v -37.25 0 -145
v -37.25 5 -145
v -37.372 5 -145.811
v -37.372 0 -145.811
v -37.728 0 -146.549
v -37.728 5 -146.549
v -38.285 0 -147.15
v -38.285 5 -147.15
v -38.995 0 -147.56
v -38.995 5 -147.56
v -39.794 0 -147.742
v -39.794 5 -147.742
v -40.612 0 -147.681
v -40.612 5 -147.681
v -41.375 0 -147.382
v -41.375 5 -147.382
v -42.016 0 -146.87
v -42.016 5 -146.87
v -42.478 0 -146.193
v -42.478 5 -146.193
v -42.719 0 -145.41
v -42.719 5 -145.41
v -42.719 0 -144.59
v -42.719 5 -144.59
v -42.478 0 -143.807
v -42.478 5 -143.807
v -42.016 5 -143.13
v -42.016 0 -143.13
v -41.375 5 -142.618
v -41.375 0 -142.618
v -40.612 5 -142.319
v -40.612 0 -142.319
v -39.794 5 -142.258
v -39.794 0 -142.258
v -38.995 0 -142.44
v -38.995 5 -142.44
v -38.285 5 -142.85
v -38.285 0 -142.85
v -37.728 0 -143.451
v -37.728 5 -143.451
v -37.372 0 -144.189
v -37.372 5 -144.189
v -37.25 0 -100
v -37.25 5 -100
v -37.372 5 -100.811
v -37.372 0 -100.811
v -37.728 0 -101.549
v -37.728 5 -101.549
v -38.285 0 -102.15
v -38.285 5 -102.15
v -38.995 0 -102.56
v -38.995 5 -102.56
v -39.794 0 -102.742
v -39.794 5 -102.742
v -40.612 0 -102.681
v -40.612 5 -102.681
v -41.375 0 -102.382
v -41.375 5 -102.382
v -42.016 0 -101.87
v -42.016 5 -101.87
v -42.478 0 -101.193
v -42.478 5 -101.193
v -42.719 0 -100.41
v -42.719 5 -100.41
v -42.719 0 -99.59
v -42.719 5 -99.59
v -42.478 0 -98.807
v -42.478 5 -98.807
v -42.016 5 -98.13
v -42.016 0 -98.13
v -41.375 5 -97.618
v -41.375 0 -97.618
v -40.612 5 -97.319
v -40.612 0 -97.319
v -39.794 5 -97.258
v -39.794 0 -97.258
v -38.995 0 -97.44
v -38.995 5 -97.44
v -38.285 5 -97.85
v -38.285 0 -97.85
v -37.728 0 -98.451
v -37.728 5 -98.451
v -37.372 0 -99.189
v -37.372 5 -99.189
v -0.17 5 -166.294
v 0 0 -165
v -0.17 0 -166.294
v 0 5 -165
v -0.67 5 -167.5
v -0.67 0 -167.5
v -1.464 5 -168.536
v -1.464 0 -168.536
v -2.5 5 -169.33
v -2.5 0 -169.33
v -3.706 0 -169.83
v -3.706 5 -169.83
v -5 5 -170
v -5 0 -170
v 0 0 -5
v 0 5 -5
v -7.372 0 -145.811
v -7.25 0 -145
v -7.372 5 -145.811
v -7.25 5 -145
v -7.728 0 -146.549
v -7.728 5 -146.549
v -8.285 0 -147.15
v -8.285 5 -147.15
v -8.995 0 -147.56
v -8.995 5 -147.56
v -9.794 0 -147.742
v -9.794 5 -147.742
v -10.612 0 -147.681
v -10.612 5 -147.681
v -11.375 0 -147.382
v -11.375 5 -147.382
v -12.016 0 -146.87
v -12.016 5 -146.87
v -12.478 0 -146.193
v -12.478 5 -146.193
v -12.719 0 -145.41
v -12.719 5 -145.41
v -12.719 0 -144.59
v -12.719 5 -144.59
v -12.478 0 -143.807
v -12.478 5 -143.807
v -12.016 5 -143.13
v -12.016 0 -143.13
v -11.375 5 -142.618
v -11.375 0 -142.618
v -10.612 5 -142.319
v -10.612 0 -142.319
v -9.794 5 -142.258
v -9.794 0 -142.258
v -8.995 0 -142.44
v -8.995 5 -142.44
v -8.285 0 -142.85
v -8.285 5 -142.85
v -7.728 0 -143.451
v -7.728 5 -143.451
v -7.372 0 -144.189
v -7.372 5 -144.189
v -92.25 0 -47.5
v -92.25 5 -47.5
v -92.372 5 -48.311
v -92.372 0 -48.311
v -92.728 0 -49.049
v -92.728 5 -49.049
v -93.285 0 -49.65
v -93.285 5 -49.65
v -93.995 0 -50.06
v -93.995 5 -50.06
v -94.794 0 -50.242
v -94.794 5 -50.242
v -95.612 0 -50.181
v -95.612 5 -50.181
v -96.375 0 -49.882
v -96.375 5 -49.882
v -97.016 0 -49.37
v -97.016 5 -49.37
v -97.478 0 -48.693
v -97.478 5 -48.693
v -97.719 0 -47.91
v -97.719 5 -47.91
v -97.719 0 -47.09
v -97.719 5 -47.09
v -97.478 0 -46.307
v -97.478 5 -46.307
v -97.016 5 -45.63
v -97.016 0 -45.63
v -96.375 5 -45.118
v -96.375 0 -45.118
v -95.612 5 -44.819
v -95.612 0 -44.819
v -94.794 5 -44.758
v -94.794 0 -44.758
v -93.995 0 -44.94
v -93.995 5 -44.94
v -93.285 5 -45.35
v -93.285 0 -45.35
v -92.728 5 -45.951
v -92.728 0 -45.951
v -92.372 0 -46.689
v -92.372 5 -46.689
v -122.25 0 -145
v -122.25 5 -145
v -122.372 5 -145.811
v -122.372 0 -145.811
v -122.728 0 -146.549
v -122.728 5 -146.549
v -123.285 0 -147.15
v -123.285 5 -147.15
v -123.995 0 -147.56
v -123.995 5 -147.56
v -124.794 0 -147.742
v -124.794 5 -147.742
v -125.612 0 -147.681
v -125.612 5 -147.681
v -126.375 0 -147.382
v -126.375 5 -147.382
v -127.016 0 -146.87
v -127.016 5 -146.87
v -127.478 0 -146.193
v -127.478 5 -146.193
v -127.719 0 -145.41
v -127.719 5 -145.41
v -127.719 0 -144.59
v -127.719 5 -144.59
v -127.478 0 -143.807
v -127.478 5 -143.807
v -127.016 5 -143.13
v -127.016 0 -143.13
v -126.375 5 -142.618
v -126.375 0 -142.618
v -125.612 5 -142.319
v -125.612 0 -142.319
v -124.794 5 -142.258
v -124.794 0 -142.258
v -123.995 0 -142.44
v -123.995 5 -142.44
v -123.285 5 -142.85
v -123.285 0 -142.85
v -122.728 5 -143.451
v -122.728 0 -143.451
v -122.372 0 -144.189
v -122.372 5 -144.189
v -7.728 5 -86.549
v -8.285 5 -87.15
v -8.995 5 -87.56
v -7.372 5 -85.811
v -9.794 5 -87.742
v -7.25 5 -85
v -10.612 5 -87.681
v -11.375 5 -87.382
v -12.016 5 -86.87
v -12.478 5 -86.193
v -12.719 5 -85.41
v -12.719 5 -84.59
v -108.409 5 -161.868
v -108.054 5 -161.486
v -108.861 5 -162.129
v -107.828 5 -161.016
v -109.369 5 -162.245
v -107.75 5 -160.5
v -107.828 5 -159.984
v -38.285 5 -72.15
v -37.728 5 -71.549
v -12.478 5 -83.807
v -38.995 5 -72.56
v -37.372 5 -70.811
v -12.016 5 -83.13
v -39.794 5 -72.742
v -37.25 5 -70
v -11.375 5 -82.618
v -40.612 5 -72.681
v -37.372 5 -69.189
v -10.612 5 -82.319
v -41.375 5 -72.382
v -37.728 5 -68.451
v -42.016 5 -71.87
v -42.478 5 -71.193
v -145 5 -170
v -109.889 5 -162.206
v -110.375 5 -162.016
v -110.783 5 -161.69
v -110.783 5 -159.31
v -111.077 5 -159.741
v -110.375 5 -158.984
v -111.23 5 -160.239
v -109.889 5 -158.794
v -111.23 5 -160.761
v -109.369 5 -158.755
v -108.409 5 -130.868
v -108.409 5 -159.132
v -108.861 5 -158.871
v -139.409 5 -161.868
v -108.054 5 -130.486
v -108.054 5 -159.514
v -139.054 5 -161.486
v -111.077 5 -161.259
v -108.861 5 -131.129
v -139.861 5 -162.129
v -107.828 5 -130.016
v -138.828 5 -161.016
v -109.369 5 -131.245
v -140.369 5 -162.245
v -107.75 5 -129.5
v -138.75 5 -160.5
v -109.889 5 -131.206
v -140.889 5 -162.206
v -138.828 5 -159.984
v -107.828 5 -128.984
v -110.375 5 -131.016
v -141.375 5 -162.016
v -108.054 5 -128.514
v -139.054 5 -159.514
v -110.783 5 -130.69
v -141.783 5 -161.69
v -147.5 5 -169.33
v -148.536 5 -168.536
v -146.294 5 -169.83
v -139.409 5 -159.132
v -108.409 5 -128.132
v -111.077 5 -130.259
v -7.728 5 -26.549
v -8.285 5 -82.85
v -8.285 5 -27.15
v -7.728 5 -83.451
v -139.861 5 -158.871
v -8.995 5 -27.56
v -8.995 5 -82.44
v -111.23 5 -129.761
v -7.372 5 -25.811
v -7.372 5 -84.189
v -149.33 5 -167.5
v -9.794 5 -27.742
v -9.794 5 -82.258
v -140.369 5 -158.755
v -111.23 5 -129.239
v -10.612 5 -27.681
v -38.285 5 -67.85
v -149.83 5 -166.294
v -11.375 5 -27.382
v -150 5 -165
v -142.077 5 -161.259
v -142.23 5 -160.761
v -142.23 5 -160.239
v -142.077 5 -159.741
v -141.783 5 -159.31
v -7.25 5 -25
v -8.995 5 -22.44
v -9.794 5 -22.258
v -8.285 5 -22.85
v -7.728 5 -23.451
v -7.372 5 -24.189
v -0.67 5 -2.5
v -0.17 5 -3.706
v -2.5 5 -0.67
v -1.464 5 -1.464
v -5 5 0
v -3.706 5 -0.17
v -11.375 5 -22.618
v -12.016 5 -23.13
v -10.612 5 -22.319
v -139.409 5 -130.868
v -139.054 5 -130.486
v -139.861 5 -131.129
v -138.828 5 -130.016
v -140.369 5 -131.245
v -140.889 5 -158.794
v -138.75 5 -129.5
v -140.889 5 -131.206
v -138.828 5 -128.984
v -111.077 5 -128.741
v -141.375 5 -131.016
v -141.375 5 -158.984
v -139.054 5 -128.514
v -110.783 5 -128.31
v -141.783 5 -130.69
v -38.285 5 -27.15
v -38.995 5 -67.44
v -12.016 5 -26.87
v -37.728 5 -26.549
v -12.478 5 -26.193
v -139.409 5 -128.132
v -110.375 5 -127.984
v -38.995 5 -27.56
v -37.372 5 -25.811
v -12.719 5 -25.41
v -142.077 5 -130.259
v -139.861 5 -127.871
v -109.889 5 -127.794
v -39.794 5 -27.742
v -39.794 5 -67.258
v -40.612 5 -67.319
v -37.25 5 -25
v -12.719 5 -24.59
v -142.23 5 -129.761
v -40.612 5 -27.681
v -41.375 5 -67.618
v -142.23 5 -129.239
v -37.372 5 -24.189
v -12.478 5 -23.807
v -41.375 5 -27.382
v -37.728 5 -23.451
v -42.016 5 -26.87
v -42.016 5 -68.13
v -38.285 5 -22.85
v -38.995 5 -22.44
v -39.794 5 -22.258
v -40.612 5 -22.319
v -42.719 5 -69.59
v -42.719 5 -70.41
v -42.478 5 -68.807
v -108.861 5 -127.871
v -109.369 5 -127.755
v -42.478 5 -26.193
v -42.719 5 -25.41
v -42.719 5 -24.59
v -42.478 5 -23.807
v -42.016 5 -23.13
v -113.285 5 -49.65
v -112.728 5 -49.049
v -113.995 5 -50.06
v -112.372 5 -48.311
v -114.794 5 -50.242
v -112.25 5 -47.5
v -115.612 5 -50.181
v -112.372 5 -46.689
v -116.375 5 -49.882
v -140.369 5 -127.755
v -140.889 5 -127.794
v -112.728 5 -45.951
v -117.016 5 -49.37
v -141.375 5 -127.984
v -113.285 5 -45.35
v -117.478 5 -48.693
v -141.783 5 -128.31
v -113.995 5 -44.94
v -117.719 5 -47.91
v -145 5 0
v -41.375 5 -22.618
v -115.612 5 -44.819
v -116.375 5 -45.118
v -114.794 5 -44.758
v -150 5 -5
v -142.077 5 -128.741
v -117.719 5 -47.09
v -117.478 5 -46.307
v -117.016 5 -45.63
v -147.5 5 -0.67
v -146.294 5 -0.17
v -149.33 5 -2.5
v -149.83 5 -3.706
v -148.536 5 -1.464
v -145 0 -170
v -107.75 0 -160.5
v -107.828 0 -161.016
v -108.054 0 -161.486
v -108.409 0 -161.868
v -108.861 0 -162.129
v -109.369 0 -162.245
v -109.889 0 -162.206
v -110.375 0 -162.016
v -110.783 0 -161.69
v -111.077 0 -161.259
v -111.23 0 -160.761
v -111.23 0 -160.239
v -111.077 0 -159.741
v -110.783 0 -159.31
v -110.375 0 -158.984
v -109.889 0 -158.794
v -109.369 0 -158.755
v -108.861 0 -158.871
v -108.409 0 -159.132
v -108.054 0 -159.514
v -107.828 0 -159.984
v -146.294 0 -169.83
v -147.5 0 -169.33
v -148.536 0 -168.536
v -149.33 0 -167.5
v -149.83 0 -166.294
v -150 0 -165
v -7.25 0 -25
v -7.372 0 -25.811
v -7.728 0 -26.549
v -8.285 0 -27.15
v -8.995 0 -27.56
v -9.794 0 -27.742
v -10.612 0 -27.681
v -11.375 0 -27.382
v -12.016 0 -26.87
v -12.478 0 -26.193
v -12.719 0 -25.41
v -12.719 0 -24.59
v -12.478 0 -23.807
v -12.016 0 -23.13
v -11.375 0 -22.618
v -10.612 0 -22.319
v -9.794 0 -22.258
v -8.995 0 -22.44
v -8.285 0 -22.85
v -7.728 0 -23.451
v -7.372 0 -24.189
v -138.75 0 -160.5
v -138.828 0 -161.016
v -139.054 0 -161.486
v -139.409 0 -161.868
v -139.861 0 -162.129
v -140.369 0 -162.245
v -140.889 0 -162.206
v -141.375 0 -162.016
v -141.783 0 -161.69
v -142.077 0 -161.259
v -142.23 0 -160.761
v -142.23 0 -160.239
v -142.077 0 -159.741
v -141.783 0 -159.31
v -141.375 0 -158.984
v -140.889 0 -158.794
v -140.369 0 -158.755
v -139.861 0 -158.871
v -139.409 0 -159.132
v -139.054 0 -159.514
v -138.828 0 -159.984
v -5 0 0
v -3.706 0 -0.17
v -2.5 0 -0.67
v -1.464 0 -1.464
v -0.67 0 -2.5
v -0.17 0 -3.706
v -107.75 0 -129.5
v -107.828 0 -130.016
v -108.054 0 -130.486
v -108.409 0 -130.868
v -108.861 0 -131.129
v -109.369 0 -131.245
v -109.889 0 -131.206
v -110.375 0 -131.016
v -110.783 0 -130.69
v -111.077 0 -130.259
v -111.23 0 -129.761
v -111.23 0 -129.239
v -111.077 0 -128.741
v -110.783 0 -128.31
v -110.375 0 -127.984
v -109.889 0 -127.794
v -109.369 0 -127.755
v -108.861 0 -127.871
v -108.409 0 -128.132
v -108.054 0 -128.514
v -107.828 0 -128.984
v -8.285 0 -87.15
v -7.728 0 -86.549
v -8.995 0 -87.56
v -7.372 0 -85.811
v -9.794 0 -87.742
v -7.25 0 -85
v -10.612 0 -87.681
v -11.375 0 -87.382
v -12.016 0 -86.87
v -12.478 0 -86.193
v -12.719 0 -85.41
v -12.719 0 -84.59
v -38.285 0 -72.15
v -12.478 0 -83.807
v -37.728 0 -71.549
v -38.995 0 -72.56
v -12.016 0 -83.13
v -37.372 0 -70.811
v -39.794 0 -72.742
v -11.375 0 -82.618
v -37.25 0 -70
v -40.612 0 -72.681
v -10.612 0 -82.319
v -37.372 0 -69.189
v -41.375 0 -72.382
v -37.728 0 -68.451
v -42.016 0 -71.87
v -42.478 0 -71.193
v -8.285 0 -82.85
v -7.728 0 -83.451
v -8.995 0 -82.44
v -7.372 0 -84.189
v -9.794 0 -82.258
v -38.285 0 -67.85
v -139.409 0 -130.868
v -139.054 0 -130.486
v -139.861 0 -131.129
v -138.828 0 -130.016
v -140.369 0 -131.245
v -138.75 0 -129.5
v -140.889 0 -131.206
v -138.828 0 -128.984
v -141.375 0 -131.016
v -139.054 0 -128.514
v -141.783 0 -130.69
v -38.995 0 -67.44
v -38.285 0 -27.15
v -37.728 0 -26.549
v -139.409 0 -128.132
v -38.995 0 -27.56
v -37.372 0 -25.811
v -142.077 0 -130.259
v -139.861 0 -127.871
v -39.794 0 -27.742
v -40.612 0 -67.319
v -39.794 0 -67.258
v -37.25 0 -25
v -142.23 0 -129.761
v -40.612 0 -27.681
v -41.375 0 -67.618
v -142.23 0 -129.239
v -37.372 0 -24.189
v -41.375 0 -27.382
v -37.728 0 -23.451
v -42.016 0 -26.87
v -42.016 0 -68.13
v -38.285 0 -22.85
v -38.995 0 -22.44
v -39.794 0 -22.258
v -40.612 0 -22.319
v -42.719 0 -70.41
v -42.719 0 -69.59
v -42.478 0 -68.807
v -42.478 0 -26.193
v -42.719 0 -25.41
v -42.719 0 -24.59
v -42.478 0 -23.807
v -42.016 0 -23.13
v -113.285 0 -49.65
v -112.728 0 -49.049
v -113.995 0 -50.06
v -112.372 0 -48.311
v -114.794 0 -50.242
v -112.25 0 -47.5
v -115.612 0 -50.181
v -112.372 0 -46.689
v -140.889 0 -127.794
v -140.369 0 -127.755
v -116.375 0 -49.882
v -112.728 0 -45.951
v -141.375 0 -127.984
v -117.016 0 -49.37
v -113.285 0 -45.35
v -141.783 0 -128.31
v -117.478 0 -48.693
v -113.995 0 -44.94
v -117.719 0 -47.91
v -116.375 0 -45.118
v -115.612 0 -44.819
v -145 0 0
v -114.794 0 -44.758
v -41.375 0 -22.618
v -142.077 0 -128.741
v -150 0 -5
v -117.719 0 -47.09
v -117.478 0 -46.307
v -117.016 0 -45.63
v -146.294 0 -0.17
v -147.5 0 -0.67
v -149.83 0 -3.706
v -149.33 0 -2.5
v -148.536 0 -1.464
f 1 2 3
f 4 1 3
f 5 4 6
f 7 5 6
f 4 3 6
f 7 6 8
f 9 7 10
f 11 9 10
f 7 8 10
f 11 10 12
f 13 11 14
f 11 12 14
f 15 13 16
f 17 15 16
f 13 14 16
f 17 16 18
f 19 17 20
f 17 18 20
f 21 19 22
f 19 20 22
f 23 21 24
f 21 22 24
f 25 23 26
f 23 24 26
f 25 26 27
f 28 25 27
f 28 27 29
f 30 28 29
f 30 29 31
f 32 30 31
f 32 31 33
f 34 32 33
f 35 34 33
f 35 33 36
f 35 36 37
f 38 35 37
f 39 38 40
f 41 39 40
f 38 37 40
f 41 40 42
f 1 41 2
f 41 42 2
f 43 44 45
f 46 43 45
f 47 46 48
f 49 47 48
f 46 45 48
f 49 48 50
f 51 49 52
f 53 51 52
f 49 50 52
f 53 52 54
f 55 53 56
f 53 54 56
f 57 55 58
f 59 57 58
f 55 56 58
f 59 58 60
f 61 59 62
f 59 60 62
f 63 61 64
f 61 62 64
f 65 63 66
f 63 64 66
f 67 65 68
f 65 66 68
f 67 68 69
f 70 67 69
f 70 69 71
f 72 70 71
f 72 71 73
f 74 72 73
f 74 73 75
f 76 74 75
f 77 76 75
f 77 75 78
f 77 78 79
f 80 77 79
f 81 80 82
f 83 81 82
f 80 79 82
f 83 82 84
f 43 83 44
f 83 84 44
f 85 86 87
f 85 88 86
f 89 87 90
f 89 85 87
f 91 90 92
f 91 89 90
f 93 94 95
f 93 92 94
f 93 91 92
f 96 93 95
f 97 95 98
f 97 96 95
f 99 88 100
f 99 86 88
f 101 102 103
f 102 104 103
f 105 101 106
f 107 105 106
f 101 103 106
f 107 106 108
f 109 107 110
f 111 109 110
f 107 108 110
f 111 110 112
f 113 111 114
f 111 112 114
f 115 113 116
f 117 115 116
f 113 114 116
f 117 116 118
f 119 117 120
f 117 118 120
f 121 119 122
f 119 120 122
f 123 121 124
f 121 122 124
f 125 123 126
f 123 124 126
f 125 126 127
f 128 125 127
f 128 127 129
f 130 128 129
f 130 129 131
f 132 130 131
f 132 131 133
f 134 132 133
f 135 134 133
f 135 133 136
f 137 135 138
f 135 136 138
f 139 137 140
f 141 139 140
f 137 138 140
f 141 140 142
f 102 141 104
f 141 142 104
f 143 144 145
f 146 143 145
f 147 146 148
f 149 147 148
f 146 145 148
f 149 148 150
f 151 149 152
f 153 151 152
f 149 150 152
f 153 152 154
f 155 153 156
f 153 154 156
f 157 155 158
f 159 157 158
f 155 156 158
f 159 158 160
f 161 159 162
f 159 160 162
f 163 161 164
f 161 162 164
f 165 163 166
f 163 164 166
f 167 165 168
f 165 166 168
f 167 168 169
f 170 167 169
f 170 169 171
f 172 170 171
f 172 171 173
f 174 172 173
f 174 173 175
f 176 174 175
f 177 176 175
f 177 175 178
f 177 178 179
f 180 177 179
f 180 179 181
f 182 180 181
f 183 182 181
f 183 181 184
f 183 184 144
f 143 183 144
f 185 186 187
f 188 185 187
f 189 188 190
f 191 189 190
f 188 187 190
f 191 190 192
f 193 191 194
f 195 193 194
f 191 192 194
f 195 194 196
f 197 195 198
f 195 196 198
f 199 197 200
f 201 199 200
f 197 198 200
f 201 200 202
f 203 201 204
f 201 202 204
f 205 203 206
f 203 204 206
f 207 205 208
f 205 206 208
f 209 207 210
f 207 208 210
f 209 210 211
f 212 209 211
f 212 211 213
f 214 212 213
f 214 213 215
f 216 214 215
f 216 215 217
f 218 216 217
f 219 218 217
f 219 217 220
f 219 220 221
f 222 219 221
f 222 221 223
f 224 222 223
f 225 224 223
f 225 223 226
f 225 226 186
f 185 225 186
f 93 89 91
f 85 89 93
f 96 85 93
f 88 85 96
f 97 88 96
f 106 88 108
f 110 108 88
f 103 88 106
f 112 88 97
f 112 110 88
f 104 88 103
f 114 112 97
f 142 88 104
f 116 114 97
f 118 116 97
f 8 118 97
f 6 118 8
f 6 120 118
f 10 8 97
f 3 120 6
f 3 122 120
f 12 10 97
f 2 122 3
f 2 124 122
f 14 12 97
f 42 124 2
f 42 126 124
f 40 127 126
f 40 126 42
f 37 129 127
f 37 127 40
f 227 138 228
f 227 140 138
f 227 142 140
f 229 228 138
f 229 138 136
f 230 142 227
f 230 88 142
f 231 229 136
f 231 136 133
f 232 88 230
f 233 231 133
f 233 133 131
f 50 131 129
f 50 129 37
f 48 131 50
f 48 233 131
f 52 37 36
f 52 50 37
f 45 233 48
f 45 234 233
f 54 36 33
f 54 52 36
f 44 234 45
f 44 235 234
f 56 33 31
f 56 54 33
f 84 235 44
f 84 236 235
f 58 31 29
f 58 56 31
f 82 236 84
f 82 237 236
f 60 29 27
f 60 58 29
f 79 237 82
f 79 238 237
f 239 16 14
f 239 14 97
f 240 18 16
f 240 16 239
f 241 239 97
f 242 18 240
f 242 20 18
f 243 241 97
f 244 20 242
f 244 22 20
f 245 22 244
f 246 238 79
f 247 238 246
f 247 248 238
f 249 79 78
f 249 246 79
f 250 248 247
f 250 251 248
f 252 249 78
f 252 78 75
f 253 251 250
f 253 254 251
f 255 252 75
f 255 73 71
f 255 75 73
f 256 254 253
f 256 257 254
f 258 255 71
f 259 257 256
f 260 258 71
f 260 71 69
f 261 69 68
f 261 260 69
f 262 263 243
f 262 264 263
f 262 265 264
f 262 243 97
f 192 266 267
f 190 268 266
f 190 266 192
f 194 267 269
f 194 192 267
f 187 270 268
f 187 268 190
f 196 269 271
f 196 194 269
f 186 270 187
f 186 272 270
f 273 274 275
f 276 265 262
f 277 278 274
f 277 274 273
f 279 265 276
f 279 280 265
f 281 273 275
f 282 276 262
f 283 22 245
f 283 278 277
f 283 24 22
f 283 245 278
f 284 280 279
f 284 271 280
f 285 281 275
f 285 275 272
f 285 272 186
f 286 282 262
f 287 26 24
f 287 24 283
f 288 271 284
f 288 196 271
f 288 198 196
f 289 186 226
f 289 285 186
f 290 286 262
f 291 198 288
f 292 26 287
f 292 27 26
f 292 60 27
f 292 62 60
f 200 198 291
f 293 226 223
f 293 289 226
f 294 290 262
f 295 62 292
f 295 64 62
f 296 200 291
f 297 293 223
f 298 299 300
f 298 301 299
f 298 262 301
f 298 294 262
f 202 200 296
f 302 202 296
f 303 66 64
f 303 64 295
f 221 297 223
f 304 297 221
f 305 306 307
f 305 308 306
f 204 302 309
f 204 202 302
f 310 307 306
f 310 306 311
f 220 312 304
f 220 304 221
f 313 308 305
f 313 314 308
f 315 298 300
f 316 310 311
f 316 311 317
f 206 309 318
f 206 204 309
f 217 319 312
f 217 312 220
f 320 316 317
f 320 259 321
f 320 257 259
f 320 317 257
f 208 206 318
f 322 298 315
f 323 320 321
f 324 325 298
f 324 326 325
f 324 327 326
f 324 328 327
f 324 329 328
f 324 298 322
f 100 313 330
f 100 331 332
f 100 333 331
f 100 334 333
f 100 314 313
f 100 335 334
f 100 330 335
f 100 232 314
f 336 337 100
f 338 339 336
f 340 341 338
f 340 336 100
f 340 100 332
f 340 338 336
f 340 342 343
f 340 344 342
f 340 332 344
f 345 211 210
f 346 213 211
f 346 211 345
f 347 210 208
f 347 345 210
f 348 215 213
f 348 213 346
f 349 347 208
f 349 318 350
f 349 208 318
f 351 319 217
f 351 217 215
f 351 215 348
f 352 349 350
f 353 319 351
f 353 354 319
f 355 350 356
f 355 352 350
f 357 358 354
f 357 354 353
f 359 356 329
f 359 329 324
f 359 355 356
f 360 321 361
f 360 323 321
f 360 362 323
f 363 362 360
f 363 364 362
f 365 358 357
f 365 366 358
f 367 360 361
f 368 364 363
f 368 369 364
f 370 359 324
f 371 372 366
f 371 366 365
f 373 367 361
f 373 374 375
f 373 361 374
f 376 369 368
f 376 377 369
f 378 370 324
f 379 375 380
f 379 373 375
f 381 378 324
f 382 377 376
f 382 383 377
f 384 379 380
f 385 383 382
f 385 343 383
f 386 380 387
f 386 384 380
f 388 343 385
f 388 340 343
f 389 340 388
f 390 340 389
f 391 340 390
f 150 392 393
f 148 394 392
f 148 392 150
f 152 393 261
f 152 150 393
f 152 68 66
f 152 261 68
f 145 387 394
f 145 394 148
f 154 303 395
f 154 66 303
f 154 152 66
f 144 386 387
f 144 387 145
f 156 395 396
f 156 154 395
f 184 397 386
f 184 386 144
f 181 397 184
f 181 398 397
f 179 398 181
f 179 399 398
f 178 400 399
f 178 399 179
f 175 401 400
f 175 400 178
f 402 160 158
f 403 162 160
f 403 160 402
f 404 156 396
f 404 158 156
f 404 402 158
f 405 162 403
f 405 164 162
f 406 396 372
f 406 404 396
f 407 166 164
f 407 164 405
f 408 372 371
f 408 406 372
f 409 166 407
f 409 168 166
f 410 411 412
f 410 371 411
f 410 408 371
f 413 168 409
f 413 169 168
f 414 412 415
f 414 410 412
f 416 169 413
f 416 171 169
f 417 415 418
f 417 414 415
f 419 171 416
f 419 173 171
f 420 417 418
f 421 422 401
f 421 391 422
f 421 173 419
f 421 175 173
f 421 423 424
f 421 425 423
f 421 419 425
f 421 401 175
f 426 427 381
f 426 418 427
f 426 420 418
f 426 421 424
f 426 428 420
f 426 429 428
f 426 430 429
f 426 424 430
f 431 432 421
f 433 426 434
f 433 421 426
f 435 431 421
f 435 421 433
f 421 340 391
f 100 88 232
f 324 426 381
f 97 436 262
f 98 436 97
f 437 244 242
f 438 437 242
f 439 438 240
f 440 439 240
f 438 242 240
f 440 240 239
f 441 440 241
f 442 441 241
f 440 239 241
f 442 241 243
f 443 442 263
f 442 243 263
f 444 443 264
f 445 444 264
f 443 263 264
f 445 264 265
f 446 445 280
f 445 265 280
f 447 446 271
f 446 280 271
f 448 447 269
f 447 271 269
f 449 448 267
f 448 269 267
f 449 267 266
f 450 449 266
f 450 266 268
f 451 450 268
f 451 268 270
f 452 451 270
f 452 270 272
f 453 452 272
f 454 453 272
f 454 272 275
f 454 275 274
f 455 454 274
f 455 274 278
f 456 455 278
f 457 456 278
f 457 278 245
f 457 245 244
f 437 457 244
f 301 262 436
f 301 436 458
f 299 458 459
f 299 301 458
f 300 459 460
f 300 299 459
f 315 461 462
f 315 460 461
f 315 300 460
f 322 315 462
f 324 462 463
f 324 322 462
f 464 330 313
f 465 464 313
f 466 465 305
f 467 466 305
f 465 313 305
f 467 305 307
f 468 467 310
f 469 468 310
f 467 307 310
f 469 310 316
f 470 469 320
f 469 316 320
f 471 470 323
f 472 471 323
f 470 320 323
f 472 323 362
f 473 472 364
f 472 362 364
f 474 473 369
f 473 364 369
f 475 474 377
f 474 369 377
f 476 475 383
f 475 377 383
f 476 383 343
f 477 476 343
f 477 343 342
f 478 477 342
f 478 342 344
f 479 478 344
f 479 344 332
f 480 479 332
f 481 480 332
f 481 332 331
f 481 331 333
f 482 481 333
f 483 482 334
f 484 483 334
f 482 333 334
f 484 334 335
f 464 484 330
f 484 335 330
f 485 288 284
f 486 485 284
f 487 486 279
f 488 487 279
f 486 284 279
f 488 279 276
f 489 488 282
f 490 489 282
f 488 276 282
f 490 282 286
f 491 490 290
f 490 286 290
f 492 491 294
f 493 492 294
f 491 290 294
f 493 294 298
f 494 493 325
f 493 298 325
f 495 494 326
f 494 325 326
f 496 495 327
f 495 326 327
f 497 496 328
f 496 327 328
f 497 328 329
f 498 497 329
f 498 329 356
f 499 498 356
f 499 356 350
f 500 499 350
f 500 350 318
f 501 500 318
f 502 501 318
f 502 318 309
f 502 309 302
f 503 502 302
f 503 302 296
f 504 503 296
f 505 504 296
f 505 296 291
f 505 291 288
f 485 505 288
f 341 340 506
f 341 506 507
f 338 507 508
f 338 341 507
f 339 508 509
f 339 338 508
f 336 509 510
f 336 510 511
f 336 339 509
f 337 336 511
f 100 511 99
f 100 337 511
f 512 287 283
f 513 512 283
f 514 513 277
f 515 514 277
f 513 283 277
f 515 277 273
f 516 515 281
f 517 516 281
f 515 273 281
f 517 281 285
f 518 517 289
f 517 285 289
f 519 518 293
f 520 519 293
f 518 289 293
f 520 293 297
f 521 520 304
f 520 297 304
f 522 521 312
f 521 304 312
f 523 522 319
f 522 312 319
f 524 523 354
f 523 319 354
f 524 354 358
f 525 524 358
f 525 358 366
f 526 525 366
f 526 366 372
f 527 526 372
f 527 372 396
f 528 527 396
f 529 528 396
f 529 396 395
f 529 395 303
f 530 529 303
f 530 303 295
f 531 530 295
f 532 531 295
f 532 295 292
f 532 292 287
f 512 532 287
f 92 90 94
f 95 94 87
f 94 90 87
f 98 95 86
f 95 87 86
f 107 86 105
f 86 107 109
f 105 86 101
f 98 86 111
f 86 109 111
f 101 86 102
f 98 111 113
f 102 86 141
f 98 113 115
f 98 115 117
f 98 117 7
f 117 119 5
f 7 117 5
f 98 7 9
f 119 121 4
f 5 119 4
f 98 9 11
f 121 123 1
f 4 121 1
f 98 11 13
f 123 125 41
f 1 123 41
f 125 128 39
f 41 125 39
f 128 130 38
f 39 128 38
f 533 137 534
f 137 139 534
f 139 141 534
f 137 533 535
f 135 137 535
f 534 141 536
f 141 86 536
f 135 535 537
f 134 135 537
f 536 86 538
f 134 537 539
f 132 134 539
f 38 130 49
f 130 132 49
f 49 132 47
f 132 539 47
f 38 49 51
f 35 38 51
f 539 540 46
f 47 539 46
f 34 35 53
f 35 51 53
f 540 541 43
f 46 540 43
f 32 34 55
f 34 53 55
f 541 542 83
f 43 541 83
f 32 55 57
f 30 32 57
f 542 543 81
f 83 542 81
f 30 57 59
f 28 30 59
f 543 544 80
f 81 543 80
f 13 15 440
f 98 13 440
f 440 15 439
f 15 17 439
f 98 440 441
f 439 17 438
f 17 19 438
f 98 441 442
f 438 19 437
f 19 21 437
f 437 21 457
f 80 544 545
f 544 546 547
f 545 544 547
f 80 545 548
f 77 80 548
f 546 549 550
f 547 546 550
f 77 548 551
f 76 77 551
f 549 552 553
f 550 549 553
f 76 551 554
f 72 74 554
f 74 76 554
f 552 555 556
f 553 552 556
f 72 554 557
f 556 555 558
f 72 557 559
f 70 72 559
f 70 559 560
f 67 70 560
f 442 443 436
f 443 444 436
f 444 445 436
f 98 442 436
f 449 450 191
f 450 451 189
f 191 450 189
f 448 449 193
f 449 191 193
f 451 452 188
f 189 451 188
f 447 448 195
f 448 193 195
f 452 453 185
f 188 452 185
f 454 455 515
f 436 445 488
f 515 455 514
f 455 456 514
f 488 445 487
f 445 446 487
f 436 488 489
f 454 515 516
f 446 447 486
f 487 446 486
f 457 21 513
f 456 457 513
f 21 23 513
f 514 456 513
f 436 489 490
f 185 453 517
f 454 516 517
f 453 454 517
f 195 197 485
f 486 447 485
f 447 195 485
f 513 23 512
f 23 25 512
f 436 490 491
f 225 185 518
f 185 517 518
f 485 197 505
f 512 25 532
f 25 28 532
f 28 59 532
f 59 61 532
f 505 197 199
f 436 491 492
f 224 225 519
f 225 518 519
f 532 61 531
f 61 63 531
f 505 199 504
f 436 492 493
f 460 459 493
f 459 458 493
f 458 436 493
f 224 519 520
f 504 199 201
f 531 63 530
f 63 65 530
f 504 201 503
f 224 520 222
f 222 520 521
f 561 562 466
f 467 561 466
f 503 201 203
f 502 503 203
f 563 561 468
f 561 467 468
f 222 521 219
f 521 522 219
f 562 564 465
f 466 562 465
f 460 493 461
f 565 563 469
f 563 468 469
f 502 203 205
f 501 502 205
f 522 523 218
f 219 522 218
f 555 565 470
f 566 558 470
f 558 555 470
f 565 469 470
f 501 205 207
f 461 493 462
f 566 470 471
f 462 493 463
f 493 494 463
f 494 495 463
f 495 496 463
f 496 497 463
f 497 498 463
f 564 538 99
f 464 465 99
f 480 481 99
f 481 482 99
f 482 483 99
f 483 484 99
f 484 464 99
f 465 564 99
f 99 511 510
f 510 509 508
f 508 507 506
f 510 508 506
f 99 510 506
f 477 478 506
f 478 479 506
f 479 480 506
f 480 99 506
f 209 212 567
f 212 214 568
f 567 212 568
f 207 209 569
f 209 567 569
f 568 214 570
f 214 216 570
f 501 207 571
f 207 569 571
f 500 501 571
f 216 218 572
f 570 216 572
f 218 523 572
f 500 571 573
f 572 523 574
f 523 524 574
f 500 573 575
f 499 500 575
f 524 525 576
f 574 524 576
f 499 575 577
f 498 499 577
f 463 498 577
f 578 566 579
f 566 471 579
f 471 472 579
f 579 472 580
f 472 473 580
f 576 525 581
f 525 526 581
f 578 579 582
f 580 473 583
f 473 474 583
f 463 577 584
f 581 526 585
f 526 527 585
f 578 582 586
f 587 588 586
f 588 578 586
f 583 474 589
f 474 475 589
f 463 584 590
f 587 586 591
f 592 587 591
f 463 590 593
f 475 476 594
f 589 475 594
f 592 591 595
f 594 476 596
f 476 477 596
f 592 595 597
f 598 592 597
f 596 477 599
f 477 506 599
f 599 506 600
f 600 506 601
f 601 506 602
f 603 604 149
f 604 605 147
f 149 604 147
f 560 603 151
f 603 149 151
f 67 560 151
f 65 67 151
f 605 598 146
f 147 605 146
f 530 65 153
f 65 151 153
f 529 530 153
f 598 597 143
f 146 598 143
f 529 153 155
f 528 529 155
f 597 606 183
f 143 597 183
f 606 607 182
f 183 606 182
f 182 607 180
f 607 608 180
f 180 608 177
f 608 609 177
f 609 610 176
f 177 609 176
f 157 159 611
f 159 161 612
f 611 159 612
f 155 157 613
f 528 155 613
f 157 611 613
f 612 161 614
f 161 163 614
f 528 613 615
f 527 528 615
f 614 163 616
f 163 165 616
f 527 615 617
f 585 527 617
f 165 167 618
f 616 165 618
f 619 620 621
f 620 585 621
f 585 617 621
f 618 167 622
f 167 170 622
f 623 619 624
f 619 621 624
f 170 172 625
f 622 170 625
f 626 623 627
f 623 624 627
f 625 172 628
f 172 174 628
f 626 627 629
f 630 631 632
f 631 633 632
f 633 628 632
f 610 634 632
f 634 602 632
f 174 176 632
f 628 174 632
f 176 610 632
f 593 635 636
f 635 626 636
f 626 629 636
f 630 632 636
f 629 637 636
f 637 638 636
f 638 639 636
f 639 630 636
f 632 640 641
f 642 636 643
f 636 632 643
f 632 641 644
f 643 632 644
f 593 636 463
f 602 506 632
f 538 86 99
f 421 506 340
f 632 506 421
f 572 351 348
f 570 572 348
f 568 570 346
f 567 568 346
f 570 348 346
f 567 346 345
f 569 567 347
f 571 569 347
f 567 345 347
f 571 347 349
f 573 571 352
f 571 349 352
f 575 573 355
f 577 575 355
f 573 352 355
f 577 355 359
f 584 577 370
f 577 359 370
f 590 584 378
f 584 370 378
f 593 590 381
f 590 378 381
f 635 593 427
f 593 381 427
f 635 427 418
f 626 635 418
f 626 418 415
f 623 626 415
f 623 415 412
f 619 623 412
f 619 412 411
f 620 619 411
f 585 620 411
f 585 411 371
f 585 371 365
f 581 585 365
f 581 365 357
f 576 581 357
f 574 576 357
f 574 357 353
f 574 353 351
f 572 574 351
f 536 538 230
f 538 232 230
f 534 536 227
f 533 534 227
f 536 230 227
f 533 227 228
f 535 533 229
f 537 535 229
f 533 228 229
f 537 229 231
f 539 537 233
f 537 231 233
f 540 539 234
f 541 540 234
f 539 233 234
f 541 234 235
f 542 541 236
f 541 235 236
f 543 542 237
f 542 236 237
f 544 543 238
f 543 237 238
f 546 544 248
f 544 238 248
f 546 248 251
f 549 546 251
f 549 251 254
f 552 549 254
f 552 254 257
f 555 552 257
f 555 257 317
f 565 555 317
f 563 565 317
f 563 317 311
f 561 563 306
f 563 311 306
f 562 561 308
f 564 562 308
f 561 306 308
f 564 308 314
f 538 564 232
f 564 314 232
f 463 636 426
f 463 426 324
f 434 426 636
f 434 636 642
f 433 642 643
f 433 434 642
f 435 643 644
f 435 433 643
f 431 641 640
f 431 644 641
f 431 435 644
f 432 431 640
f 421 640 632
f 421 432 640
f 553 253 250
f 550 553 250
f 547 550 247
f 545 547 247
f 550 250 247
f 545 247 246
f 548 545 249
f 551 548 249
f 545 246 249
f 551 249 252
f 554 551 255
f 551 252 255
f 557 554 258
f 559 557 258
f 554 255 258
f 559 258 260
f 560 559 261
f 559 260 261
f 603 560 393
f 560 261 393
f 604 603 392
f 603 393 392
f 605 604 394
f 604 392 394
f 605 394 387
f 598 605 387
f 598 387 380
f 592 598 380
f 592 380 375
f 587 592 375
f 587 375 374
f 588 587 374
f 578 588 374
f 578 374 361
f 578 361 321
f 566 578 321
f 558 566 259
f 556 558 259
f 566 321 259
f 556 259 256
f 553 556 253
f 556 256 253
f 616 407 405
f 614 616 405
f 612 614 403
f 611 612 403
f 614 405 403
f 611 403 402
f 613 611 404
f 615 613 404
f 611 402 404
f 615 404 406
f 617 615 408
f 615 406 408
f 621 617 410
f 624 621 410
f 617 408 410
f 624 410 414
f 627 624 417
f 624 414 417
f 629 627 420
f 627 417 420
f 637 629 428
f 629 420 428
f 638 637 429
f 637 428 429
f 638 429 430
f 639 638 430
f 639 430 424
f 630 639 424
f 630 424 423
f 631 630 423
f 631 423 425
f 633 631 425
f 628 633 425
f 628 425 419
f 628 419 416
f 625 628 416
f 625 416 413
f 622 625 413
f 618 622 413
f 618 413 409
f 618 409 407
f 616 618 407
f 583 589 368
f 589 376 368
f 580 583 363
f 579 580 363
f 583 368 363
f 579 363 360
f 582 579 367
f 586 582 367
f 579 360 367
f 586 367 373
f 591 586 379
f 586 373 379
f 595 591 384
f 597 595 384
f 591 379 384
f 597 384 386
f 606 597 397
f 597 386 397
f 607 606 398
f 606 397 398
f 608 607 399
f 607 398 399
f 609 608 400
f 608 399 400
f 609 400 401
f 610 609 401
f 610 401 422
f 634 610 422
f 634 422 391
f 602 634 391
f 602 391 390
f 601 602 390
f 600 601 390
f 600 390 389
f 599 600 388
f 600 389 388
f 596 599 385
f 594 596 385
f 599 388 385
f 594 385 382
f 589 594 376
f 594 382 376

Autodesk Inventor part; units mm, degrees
ref_plane "YZ Plane" through (0, 0, 0) normal (1, 0, 0) x (0, 1, 0)
ref_plane "XZ Plane" through (0, 0, 0) normal (0, 1, 0) x (-1, 0, 0)
ref_plane "XY Plane" through (0, 0, 0) normal (0, 0, 1) x (1, 0, 0)
sketch "Sketch1" plane through (0, 0, 0) normal (0, 1, 0) x (-1, 0, 0)
  line L0 (0, 0) -> (150, 0)
  line L1 (150, 0) -> (150, -170)
  line L2 (150, -170) -> (0, -170)
  line L3 (0, -170) -> (0, 0)
  dimension "d0" = 150
  dimension "d1" = 170
extrude "Extrusion1" add sketch "Sketch1" along normal blind 5
fillet "Fillet1" radius 5 4 edges at (0, 2.5, 0) (0, 2.5, -170) (-150, 2.5, 0) (-150, 2.5, -170)
sketch "Sketch2" plane through (0, 5, 0) normal (0, 1, 0) x (1, 0, 0)
  arc A0 (-145, 170) -> (-150, 165) centre (-145, 165) ccw projected
  line L0 (-150, 165) -> (-150, 5) projected
  arc A1 (-150, 5) -> (-145, 0) centre (-145, 5) ccw projected
  line L1 (-145, 0) -> (-5, 0) projected
  arc A2 (-5, 0) -> (0, 5) centre (-5, 5) ccw projected
  line L2 (0, 5) -> (0, 165) projected
  arc A3 (0, 165) -> (-5, 170) centre (-5, 165) ccw projected
  line L3 (-5, 170) -> (-145, 170) projected
  circle A4 centre (-125, 145) radius 2.75
  circle A5 centre (-140.5, 160.5) radius 1.75
  circle A6 centre (-140.5, 129.5) radius 1.75
  circle A7 centre (-109.5, 160.5) radius 1.75
  circle A8 centre (-109.5, 129.5) radius 1.75
  circle A9 centre (-40, 25) radius 2.75
  circle A10 centre (-10, 25) radius 2.75
  circle A11 centre (-40, 145) radius 2.75
  circle A12 centre (-10, 145) radius 2.75
  circle A13 centre (-10, 85) radius 2.75
  circle A14 centre (-40, 70) radius 2.75
  circle A15 centre (-40, 100) radius 2.75
  circle A16 centre (-115, 47.5) radius 2.75
  circle A17 centre (-95, 47.5) radius 2.75
  point P0 (0, 0)
  dimension "d5" = 5.5
  dimension "d6" = 25
  dimension "d7" = 25
  dimension "d8" = 3.5
  dimension "d9" = 9.5
  dimension "d10" = 9.5
  dimension "d13" = 31
  dimension "d16" = 31
  dimension "d19" = 5.5
  dimension "d20" = 25
  dimension "d21" = 5.5
  dimension "d22" = 25
  dimension "d23" = 5.5
  dimension "d24" = 5.5
  dimension "d25" = 25
  dimension "d26" = 25
  dimension "d27" = 5.5
  dimension "d28" = 170
  dimension "d29" = 85
  dimension "d30" = 5.5
  dimension "d31" = 5.5
  dimension "d32" = 30
  dimension "d33" = 70
  dimension "d34" = 10
  dimension "d35" = 10
  dimension "d36" = 10
  dimension "d37" = 40
  dimension "d38" = 40
  dimension "d39" = 40
  dimension "d40" = 40
  dimension "d43" = 5.5
  dimension "d44" = 5.5
  dimension "d45" = 45
  dimension "d46" = 22.5
  dimension "d47" = 22.5
  dimension "d48" = 20
  dimension "d49" = 35
extrude "Extrusion2" cut sketch "Sketch2" against normal blind 5 contours A4 | A5 | A6 | A7 | A8 | A9 | A10 | A11 | A12 | A13 | A14 | A15 | A16 | A17
equation "\"d20\" = d6"
equation "\"d22\" = d20"
equation "\"d25\" = d6"
equation "\"d26\" = d25"
equation "\"d29\" = 0.5 * d28"
equation "\"d33\" = 0.5 * d28 - 0.5 * d32"
equation "\"d35\" = d34"
equation "\"d36\" = d34"
equation "\"d38\" = d37"
equation "\"d39\" = d38"
equation "\"d40\" = d37"
equation "\"d46\" = 0.5 * d45"
equation "\"d47\" = d46"
properties part number "HeadPlate" material "Steel, Carbon"
